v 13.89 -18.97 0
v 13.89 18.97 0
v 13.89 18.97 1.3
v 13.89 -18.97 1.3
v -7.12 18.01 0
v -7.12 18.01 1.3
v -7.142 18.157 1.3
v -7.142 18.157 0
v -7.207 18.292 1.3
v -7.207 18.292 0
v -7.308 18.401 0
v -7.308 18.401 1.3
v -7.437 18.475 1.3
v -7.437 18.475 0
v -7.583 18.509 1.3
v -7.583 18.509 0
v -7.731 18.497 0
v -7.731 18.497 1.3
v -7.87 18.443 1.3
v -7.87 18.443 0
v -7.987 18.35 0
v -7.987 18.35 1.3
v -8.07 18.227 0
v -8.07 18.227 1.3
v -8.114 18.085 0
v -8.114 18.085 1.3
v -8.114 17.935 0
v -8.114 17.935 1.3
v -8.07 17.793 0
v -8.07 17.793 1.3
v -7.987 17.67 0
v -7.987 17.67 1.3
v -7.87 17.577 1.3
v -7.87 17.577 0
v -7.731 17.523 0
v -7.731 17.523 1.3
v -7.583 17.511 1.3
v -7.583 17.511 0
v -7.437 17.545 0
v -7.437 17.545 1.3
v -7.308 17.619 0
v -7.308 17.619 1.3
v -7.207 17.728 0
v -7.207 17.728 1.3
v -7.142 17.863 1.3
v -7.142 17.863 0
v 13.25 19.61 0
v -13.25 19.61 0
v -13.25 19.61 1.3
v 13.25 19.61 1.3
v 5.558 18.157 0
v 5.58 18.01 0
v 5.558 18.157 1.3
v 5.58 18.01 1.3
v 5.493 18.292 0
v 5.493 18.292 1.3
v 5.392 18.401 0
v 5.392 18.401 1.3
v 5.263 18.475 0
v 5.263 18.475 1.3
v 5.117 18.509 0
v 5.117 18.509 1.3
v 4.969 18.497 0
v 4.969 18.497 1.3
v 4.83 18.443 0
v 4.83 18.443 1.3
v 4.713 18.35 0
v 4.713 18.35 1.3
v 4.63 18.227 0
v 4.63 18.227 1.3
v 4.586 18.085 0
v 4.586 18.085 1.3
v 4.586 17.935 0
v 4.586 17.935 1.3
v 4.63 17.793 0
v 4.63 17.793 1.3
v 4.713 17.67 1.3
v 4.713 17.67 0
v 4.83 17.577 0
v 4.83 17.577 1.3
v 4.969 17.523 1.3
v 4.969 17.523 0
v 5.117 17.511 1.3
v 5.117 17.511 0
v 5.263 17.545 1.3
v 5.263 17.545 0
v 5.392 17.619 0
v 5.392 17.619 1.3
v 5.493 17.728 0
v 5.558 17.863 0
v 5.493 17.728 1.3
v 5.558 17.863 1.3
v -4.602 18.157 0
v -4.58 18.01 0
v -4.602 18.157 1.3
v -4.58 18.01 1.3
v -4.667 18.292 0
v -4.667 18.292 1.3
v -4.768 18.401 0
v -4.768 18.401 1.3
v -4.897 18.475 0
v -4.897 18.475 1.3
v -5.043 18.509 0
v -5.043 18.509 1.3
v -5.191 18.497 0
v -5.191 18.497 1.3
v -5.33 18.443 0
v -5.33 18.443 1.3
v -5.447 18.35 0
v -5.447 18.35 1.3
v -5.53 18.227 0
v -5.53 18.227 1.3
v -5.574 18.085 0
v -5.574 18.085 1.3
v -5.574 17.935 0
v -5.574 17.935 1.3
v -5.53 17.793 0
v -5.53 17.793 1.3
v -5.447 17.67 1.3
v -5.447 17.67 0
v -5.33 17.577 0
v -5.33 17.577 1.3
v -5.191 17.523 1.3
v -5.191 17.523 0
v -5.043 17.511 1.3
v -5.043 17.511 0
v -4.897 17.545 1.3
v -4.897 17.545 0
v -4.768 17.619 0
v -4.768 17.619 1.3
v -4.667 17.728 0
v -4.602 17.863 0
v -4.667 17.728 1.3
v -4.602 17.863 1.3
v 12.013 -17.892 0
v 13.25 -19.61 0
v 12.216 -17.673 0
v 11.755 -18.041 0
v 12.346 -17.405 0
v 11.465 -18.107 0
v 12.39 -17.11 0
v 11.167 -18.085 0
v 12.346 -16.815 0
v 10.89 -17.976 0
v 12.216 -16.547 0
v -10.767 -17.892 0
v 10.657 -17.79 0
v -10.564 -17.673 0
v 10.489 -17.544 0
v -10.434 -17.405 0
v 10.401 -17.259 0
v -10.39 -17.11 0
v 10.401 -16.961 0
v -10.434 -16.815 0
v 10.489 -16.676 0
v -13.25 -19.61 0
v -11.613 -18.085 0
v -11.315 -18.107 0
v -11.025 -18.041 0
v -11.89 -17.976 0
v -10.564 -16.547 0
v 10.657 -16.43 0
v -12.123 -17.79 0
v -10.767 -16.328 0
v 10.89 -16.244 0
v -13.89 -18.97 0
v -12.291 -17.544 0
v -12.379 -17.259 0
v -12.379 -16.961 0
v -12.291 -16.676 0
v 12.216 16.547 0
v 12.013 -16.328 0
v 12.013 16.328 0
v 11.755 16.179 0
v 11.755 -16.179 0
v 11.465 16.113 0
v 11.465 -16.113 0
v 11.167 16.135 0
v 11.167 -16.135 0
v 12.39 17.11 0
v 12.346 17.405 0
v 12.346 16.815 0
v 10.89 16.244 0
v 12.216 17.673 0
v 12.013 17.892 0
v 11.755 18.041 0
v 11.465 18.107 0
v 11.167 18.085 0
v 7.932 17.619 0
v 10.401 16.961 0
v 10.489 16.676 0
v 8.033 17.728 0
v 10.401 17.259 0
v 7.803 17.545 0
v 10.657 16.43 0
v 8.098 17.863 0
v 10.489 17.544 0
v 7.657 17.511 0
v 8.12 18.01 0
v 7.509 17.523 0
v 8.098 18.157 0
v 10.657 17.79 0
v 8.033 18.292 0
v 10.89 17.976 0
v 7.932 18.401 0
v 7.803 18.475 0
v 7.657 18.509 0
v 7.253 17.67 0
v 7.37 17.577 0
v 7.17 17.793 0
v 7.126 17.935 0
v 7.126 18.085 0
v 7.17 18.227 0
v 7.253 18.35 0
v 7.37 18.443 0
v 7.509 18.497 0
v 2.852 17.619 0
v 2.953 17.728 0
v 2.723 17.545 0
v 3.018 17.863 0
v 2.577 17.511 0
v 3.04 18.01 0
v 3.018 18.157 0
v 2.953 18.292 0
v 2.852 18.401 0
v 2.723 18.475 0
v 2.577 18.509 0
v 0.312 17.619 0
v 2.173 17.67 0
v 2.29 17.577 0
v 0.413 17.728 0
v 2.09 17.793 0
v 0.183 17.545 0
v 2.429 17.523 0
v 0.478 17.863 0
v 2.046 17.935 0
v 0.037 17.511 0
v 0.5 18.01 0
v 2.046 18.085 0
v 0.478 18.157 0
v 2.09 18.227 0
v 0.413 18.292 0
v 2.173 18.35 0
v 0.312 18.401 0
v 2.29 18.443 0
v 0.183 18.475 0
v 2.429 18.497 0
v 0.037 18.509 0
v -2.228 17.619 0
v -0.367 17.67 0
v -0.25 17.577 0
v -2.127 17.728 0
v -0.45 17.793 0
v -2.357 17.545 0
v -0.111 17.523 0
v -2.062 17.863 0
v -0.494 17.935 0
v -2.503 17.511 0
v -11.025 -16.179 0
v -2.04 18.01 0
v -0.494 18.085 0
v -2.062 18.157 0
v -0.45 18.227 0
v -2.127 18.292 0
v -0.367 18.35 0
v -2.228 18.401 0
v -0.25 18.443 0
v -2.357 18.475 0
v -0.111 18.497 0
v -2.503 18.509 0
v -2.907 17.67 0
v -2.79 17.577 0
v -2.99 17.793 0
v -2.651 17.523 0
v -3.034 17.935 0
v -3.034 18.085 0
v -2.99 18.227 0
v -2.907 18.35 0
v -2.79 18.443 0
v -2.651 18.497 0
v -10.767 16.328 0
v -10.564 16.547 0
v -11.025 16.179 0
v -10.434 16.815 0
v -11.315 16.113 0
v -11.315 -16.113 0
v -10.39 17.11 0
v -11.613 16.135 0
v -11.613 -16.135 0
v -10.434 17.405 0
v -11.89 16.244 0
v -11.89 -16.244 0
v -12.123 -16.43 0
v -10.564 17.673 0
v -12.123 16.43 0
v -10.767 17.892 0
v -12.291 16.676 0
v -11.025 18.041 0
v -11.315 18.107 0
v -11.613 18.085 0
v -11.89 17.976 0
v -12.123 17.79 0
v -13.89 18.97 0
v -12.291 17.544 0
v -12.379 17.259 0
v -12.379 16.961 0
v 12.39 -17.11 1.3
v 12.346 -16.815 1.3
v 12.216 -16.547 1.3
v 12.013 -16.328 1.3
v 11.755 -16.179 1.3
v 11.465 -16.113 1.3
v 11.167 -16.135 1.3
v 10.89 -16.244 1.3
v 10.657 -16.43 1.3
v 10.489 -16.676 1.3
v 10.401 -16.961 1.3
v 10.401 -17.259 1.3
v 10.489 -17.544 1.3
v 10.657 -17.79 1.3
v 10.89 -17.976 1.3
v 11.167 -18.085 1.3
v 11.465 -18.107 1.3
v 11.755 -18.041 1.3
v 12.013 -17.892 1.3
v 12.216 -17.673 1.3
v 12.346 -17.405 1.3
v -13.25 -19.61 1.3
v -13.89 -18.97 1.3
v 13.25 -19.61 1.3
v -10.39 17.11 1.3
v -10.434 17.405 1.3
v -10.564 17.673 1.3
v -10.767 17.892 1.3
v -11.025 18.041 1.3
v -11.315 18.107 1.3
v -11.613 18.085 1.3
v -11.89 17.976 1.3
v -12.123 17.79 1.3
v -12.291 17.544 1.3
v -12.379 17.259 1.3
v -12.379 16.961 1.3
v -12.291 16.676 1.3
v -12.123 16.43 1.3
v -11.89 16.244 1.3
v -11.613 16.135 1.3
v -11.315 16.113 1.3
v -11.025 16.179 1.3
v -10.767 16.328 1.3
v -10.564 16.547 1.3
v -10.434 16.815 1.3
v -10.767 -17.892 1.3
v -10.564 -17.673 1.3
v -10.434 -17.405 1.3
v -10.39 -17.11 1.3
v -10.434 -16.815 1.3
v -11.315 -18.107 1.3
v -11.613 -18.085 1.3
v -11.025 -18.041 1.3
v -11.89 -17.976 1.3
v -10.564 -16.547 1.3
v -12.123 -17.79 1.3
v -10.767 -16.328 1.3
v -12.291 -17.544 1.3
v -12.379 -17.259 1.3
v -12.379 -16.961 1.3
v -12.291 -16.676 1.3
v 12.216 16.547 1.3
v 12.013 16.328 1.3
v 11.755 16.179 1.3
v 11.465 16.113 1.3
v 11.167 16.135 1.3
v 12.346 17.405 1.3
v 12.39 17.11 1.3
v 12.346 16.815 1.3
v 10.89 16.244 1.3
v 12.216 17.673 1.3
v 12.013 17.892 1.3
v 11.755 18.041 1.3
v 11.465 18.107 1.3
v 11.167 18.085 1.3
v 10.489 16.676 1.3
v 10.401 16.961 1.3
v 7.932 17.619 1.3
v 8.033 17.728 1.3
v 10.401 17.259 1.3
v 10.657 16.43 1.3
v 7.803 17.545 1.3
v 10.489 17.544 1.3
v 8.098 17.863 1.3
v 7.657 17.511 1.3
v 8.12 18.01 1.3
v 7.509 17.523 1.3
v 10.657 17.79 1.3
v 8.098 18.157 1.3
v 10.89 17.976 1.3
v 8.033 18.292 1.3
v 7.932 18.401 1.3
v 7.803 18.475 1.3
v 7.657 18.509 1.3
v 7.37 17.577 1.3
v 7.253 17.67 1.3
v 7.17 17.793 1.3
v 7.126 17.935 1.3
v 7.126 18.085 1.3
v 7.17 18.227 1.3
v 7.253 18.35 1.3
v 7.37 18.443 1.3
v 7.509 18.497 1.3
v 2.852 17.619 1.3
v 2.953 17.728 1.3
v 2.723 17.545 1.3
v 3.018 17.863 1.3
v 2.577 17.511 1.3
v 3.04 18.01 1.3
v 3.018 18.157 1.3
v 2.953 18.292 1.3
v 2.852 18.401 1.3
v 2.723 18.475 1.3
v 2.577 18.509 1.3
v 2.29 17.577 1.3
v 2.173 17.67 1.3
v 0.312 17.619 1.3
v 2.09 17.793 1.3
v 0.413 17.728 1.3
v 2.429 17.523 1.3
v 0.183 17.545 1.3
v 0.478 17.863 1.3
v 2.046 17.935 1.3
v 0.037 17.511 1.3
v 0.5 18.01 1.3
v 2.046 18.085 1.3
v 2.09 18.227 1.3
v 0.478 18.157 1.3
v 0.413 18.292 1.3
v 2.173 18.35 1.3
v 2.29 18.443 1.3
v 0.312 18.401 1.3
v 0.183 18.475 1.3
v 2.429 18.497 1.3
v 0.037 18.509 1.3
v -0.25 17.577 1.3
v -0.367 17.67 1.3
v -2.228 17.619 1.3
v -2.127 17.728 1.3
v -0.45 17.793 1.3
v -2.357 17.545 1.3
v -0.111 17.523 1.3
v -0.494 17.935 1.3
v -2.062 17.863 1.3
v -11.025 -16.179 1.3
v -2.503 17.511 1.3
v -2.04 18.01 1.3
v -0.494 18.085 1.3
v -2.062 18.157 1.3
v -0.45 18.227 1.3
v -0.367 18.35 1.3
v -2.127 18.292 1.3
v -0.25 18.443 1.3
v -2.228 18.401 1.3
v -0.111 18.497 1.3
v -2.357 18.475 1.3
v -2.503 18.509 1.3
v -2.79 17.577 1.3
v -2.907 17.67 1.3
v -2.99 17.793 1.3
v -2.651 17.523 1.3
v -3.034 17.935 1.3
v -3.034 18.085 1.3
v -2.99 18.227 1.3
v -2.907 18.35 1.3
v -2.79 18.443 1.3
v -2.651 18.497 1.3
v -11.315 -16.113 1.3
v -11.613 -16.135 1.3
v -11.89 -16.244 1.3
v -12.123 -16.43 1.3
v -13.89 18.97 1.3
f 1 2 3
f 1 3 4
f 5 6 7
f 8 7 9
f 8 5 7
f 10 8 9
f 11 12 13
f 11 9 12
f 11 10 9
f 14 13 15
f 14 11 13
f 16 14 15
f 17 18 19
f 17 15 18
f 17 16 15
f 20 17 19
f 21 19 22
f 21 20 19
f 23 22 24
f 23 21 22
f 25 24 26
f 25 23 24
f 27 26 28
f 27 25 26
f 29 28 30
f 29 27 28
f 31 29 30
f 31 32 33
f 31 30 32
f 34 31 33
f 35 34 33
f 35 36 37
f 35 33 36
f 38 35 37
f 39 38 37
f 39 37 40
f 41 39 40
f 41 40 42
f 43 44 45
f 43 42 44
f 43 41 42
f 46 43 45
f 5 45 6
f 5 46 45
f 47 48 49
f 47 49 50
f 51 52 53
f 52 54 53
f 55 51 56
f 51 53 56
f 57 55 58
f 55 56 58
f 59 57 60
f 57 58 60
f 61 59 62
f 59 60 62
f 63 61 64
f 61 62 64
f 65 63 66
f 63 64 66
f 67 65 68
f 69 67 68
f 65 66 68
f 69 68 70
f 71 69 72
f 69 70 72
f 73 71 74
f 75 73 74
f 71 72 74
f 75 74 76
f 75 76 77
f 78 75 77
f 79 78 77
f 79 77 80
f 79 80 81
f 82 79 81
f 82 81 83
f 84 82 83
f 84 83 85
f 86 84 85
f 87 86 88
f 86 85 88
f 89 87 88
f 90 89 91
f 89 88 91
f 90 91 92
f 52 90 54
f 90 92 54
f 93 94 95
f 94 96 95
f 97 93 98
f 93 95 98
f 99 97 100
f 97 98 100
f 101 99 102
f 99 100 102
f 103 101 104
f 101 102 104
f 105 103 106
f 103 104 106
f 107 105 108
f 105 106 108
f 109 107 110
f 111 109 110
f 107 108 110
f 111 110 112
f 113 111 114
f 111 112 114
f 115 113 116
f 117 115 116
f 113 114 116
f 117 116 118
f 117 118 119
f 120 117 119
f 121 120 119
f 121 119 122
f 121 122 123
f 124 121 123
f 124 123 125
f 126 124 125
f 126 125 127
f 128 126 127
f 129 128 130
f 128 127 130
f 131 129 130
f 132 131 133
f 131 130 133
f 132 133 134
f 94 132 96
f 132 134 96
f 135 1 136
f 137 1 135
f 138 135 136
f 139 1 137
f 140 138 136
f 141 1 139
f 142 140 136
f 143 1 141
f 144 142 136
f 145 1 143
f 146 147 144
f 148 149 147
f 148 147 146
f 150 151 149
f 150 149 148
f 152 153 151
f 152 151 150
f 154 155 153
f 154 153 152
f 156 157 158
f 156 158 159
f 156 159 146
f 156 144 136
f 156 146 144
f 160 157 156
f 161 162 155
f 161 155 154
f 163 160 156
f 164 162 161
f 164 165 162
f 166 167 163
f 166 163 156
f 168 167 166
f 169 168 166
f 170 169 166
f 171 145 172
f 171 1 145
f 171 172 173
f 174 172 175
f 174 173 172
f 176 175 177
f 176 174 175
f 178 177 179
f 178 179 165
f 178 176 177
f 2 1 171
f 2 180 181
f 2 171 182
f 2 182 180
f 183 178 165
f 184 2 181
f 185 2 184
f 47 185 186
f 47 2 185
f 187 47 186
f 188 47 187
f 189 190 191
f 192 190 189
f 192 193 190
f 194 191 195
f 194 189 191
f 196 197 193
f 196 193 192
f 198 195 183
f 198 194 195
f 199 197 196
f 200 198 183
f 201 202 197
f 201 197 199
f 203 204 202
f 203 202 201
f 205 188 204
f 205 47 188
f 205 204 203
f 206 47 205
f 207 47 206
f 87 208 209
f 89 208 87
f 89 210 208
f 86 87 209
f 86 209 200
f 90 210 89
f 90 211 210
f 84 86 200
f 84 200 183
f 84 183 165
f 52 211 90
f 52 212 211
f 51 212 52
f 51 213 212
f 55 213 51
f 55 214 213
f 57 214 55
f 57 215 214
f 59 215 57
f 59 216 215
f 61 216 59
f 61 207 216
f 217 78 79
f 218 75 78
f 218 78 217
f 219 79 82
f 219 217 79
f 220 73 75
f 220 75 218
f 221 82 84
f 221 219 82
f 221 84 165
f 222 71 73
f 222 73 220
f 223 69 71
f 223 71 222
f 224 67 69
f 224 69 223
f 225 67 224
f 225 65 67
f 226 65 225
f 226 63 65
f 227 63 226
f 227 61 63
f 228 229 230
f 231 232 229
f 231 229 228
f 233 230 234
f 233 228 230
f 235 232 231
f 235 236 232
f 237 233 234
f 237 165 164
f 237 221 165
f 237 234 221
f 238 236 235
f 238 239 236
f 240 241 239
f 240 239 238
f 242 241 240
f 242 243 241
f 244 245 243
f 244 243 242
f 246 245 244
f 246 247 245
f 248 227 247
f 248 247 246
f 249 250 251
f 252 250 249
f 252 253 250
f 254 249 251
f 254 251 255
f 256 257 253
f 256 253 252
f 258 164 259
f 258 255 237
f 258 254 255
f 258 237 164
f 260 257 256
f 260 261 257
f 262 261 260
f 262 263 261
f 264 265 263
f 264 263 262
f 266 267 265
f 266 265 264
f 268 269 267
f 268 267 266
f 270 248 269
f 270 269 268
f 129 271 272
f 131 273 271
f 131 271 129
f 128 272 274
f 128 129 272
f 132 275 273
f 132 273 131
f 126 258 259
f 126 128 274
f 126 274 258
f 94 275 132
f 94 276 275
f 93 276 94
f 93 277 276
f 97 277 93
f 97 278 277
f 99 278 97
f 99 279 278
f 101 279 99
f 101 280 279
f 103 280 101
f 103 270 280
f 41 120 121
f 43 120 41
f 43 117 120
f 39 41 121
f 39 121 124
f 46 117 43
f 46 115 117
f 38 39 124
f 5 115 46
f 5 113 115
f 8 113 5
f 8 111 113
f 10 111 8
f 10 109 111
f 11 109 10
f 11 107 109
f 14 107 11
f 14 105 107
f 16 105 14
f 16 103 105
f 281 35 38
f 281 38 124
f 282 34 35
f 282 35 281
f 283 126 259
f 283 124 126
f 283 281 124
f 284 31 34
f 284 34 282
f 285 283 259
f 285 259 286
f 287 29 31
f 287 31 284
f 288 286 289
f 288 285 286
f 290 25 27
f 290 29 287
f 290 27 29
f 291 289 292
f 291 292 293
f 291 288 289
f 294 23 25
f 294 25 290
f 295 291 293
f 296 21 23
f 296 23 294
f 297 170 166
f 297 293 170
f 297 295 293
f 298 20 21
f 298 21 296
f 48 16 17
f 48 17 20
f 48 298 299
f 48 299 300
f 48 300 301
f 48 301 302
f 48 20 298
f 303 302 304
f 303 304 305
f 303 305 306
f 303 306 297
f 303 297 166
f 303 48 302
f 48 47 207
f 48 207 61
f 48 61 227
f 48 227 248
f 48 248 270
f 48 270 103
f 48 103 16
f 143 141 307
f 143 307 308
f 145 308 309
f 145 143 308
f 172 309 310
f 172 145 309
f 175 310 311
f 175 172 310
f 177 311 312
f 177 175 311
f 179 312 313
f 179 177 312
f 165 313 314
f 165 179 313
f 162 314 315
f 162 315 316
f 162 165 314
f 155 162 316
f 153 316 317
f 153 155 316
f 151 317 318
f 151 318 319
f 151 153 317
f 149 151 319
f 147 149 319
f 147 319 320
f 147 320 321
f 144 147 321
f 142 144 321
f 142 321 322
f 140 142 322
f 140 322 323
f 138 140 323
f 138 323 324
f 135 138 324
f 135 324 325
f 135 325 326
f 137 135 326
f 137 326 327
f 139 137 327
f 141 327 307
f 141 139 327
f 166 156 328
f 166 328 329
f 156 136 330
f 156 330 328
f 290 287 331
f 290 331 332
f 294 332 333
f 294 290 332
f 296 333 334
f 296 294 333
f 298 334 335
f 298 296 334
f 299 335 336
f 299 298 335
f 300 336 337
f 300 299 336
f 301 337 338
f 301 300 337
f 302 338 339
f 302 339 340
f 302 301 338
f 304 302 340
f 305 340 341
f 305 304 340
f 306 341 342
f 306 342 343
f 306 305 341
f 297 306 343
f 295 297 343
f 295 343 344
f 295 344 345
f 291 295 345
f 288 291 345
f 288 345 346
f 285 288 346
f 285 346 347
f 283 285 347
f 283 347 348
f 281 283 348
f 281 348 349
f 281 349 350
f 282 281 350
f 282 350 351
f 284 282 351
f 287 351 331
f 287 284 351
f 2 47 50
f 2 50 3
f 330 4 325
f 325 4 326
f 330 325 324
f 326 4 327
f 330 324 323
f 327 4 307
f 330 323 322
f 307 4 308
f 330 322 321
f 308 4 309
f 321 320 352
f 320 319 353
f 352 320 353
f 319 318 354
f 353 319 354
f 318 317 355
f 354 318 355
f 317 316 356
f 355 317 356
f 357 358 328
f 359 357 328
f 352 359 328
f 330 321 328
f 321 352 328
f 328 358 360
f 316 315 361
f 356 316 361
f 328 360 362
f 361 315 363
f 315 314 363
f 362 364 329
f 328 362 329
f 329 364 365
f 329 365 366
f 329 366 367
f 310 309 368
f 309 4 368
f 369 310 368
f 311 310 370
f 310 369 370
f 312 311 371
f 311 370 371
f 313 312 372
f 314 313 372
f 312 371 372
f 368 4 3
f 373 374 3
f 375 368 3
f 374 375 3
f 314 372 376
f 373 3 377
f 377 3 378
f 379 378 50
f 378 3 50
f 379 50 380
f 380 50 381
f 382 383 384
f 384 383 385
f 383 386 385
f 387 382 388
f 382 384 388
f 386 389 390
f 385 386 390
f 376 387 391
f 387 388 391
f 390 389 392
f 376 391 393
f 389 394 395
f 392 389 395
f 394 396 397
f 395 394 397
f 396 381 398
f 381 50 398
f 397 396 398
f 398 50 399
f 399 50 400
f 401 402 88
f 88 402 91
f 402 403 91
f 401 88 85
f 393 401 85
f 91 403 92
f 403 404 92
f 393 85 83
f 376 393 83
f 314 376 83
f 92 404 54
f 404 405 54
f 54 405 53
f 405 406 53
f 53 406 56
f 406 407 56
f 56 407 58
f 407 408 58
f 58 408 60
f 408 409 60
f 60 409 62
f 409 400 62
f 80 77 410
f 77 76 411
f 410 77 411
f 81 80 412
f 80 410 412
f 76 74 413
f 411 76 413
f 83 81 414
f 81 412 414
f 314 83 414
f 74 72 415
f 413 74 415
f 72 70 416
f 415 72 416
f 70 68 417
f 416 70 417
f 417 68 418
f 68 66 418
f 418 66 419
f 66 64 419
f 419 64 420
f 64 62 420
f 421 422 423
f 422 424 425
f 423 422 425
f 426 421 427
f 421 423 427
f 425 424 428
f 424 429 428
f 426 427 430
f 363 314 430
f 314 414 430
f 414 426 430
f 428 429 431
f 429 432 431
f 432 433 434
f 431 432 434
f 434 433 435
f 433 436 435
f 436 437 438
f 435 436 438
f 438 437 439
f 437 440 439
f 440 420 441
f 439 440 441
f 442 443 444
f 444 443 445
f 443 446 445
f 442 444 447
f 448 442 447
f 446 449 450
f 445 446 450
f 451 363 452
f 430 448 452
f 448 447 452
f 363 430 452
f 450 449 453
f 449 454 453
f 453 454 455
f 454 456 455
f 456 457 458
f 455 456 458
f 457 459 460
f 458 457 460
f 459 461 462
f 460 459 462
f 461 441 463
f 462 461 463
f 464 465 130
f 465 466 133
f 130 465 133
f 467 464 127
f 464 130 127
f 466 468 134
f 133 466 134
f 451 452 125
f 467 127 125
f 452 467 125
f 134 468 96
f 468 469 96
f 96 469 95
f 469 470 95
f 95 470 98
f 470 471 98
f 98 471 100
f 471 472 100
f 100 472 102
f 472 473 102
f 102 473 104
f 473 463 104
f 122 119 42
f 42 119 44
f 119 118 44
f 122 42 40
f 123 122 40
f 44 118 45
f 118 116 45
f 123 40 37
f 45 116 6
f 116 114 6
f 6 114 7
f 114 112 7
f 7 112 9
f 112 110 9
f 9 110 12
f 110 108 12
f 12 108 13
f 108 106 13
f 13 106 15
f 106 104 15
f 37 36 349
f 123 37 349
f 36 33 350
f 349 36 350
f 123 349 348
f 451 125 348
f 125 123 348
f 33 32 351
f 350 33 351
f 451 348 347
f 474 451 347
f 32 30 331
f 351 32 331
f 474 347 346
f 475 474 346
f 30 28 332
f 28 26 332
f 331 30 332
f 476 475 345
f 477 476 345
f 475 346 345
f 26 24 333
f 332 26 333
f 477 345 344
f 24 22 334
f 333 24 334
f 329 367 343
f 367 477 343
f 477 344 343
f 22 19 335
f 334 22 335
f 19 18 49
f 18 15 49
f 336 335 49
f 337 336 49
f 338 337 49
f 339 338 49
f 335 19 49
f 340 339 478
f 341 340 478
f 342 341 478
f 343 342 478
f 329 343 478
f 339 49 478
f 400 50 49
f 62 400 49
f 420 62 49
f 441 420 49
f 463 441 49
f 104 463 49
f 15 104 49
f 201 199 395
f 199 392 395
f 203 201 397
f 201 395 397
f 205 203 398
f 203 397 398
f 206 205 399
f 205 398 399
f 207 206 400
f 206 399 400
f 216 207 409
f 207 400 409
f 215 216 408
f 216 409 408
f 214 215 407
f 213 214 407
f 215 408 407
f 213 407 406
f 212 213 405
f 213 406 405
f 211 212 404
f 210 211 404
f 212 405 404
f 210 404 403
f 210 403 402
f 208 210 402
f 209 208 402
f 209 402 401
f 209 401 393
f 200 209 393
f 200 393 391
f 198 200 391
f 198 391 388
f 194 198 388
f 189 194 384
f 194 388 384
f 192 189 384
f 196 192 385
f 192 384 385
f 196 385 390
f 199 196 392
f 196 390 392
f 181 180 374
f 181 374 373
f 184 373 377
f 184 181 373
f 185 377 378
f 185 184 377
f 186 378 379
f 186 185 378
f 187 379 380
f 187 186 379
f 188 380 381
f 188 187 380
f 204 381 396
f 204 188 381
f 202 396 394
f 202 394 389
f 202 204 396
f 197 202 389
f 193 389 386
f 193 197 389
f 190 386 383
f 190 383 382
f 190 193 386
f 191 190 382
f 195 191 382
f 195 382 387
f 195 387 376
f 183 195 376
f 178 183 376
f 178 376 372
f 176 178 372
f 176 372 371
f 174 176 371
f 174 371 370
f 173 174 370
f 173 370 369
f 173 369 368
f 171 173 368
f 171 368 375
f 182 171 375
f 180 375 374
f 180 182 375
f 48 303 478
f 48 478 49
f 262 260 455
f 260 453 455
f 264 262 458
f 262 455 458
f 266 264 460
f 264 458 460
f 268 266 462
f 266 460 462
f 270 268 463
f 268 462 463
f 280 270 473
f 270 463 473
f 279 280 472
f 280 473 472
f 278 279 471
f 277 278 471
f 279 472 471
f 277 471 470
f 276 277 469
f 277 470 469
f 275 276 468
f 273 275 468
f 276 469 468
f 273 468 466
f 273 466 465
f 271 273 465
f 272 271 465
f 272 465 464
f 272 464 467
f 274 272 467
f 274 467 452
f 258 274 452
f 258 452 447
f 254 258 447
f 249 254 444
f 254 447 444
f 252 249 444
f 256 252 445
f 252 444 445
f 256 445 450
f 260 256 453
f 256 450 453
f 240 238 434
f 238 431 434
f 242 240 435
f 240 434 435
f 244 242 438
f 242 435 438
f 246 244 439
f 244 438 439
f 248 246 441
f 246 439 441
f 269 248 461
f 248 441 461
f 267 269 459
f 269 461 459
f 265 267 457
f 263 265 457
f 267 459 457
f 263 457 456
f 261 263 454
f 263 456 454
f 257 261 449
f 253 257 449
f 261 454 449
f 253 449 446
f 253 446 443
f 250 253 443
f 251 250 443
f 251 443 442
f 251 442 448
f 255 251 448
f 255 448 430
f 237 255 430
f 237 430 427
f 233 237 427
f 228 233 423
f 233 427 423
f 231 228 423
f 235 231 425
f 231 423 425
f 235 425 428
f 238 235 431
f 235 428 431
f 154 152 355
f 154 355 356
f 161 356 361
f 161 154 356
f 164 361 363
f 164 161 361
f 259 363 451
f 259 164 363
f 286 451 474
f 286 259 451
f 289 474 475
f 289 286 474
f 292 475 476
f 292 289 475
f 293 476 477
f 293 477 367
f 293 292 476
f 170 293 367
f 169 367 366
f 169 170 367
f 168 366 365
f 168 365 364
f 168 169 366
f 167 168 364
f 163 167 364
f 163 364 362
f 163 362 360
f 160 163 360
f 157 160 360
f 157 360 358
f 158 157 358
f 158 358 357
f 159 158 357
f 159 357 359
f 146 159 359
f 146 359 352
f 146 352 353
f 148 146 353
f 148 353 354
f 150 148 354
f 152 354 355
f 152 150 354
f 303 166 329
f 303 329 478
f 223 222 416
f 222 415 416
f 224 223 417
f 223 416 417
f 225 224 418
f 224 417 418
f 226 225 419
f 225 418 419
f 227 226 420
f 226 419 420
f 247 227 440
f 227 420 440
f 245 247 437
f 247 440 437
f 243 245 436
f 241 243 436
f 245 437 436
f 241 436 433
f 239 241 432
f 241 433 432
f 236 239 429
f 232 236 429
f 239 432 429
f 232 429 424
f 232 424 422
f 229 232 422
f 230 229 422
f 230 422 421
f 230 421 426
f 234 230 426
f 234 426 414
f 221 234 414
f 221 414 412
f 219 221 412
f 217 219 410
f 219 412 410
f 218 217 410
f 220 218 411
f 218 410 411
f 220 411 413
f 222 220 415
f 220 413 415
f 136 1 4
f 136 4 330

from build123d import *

# Parameters (mm, degrees)
SKETCH068_R         = 1
PAD021_DEPTH        = 1.3
SKETCH002_R         = 0.5
POCKET_DEPTH        = 0.001
POCKET_DEPTH_BACK   = 1.301
LINEARPATTERN_COUNT = 7
LINEARPATTERN_PITCH = 2.54


with BuildPart() as part:
    # Sketch068 → Pad021 (new body)
    with BuildSketch(Plane.XY):
        Polygon((-13.25, 19.61), (13.25, 19.61), (13.89, 18.97), (13.89, -18.97), (13.25, -19.61), (-13.25, -19.61), (-13.89, -18.97), (-13.89, 18.97), align=None)
        with Locations((11.39, 17.11)):
            Circle(SKETCH068_R, mode=Mode.SUBTRACT)
        with Locations((-11.39, 17.11)):
            Circle(SKETCH068_R, mode=Mode.SUBTRACT)
        with Locations((-11.39, -17.11)):
            Circle(SKETCH068_R, mode=Mode.SUBTRACT)
        with Locations((11.39, -17.11)):
            Circle(SKETCH068_R, mode=Mode.SUBTRACT)
    extrude(amount=PAD021_DEPTH)

    # Sketch002 → Pocket (cut, two sides)
    with BuildSketch(Plane.XY) as pocket_sk:
        with Locations((-7.62, 18.01)):
            Circle(SKETCH002_R)
    pocket = extrude(amount=-POCKET_DEPTH, mode=Mode.SUBTRACT) + extrude(pocket_sk.sketch, amount=POCKET_DEPTH_BACK, mode=Mode.SUBTRACT)

    # LinearPattern: Pocket ×7
    with Locations(*[(i * LINEARPATTERN_PITCH, 0, 0) for i in range(1, LINEARPATTERN_COUNT)]):
        add(pocket, mode=Mode.SUBTRACT)


solid = part.part
